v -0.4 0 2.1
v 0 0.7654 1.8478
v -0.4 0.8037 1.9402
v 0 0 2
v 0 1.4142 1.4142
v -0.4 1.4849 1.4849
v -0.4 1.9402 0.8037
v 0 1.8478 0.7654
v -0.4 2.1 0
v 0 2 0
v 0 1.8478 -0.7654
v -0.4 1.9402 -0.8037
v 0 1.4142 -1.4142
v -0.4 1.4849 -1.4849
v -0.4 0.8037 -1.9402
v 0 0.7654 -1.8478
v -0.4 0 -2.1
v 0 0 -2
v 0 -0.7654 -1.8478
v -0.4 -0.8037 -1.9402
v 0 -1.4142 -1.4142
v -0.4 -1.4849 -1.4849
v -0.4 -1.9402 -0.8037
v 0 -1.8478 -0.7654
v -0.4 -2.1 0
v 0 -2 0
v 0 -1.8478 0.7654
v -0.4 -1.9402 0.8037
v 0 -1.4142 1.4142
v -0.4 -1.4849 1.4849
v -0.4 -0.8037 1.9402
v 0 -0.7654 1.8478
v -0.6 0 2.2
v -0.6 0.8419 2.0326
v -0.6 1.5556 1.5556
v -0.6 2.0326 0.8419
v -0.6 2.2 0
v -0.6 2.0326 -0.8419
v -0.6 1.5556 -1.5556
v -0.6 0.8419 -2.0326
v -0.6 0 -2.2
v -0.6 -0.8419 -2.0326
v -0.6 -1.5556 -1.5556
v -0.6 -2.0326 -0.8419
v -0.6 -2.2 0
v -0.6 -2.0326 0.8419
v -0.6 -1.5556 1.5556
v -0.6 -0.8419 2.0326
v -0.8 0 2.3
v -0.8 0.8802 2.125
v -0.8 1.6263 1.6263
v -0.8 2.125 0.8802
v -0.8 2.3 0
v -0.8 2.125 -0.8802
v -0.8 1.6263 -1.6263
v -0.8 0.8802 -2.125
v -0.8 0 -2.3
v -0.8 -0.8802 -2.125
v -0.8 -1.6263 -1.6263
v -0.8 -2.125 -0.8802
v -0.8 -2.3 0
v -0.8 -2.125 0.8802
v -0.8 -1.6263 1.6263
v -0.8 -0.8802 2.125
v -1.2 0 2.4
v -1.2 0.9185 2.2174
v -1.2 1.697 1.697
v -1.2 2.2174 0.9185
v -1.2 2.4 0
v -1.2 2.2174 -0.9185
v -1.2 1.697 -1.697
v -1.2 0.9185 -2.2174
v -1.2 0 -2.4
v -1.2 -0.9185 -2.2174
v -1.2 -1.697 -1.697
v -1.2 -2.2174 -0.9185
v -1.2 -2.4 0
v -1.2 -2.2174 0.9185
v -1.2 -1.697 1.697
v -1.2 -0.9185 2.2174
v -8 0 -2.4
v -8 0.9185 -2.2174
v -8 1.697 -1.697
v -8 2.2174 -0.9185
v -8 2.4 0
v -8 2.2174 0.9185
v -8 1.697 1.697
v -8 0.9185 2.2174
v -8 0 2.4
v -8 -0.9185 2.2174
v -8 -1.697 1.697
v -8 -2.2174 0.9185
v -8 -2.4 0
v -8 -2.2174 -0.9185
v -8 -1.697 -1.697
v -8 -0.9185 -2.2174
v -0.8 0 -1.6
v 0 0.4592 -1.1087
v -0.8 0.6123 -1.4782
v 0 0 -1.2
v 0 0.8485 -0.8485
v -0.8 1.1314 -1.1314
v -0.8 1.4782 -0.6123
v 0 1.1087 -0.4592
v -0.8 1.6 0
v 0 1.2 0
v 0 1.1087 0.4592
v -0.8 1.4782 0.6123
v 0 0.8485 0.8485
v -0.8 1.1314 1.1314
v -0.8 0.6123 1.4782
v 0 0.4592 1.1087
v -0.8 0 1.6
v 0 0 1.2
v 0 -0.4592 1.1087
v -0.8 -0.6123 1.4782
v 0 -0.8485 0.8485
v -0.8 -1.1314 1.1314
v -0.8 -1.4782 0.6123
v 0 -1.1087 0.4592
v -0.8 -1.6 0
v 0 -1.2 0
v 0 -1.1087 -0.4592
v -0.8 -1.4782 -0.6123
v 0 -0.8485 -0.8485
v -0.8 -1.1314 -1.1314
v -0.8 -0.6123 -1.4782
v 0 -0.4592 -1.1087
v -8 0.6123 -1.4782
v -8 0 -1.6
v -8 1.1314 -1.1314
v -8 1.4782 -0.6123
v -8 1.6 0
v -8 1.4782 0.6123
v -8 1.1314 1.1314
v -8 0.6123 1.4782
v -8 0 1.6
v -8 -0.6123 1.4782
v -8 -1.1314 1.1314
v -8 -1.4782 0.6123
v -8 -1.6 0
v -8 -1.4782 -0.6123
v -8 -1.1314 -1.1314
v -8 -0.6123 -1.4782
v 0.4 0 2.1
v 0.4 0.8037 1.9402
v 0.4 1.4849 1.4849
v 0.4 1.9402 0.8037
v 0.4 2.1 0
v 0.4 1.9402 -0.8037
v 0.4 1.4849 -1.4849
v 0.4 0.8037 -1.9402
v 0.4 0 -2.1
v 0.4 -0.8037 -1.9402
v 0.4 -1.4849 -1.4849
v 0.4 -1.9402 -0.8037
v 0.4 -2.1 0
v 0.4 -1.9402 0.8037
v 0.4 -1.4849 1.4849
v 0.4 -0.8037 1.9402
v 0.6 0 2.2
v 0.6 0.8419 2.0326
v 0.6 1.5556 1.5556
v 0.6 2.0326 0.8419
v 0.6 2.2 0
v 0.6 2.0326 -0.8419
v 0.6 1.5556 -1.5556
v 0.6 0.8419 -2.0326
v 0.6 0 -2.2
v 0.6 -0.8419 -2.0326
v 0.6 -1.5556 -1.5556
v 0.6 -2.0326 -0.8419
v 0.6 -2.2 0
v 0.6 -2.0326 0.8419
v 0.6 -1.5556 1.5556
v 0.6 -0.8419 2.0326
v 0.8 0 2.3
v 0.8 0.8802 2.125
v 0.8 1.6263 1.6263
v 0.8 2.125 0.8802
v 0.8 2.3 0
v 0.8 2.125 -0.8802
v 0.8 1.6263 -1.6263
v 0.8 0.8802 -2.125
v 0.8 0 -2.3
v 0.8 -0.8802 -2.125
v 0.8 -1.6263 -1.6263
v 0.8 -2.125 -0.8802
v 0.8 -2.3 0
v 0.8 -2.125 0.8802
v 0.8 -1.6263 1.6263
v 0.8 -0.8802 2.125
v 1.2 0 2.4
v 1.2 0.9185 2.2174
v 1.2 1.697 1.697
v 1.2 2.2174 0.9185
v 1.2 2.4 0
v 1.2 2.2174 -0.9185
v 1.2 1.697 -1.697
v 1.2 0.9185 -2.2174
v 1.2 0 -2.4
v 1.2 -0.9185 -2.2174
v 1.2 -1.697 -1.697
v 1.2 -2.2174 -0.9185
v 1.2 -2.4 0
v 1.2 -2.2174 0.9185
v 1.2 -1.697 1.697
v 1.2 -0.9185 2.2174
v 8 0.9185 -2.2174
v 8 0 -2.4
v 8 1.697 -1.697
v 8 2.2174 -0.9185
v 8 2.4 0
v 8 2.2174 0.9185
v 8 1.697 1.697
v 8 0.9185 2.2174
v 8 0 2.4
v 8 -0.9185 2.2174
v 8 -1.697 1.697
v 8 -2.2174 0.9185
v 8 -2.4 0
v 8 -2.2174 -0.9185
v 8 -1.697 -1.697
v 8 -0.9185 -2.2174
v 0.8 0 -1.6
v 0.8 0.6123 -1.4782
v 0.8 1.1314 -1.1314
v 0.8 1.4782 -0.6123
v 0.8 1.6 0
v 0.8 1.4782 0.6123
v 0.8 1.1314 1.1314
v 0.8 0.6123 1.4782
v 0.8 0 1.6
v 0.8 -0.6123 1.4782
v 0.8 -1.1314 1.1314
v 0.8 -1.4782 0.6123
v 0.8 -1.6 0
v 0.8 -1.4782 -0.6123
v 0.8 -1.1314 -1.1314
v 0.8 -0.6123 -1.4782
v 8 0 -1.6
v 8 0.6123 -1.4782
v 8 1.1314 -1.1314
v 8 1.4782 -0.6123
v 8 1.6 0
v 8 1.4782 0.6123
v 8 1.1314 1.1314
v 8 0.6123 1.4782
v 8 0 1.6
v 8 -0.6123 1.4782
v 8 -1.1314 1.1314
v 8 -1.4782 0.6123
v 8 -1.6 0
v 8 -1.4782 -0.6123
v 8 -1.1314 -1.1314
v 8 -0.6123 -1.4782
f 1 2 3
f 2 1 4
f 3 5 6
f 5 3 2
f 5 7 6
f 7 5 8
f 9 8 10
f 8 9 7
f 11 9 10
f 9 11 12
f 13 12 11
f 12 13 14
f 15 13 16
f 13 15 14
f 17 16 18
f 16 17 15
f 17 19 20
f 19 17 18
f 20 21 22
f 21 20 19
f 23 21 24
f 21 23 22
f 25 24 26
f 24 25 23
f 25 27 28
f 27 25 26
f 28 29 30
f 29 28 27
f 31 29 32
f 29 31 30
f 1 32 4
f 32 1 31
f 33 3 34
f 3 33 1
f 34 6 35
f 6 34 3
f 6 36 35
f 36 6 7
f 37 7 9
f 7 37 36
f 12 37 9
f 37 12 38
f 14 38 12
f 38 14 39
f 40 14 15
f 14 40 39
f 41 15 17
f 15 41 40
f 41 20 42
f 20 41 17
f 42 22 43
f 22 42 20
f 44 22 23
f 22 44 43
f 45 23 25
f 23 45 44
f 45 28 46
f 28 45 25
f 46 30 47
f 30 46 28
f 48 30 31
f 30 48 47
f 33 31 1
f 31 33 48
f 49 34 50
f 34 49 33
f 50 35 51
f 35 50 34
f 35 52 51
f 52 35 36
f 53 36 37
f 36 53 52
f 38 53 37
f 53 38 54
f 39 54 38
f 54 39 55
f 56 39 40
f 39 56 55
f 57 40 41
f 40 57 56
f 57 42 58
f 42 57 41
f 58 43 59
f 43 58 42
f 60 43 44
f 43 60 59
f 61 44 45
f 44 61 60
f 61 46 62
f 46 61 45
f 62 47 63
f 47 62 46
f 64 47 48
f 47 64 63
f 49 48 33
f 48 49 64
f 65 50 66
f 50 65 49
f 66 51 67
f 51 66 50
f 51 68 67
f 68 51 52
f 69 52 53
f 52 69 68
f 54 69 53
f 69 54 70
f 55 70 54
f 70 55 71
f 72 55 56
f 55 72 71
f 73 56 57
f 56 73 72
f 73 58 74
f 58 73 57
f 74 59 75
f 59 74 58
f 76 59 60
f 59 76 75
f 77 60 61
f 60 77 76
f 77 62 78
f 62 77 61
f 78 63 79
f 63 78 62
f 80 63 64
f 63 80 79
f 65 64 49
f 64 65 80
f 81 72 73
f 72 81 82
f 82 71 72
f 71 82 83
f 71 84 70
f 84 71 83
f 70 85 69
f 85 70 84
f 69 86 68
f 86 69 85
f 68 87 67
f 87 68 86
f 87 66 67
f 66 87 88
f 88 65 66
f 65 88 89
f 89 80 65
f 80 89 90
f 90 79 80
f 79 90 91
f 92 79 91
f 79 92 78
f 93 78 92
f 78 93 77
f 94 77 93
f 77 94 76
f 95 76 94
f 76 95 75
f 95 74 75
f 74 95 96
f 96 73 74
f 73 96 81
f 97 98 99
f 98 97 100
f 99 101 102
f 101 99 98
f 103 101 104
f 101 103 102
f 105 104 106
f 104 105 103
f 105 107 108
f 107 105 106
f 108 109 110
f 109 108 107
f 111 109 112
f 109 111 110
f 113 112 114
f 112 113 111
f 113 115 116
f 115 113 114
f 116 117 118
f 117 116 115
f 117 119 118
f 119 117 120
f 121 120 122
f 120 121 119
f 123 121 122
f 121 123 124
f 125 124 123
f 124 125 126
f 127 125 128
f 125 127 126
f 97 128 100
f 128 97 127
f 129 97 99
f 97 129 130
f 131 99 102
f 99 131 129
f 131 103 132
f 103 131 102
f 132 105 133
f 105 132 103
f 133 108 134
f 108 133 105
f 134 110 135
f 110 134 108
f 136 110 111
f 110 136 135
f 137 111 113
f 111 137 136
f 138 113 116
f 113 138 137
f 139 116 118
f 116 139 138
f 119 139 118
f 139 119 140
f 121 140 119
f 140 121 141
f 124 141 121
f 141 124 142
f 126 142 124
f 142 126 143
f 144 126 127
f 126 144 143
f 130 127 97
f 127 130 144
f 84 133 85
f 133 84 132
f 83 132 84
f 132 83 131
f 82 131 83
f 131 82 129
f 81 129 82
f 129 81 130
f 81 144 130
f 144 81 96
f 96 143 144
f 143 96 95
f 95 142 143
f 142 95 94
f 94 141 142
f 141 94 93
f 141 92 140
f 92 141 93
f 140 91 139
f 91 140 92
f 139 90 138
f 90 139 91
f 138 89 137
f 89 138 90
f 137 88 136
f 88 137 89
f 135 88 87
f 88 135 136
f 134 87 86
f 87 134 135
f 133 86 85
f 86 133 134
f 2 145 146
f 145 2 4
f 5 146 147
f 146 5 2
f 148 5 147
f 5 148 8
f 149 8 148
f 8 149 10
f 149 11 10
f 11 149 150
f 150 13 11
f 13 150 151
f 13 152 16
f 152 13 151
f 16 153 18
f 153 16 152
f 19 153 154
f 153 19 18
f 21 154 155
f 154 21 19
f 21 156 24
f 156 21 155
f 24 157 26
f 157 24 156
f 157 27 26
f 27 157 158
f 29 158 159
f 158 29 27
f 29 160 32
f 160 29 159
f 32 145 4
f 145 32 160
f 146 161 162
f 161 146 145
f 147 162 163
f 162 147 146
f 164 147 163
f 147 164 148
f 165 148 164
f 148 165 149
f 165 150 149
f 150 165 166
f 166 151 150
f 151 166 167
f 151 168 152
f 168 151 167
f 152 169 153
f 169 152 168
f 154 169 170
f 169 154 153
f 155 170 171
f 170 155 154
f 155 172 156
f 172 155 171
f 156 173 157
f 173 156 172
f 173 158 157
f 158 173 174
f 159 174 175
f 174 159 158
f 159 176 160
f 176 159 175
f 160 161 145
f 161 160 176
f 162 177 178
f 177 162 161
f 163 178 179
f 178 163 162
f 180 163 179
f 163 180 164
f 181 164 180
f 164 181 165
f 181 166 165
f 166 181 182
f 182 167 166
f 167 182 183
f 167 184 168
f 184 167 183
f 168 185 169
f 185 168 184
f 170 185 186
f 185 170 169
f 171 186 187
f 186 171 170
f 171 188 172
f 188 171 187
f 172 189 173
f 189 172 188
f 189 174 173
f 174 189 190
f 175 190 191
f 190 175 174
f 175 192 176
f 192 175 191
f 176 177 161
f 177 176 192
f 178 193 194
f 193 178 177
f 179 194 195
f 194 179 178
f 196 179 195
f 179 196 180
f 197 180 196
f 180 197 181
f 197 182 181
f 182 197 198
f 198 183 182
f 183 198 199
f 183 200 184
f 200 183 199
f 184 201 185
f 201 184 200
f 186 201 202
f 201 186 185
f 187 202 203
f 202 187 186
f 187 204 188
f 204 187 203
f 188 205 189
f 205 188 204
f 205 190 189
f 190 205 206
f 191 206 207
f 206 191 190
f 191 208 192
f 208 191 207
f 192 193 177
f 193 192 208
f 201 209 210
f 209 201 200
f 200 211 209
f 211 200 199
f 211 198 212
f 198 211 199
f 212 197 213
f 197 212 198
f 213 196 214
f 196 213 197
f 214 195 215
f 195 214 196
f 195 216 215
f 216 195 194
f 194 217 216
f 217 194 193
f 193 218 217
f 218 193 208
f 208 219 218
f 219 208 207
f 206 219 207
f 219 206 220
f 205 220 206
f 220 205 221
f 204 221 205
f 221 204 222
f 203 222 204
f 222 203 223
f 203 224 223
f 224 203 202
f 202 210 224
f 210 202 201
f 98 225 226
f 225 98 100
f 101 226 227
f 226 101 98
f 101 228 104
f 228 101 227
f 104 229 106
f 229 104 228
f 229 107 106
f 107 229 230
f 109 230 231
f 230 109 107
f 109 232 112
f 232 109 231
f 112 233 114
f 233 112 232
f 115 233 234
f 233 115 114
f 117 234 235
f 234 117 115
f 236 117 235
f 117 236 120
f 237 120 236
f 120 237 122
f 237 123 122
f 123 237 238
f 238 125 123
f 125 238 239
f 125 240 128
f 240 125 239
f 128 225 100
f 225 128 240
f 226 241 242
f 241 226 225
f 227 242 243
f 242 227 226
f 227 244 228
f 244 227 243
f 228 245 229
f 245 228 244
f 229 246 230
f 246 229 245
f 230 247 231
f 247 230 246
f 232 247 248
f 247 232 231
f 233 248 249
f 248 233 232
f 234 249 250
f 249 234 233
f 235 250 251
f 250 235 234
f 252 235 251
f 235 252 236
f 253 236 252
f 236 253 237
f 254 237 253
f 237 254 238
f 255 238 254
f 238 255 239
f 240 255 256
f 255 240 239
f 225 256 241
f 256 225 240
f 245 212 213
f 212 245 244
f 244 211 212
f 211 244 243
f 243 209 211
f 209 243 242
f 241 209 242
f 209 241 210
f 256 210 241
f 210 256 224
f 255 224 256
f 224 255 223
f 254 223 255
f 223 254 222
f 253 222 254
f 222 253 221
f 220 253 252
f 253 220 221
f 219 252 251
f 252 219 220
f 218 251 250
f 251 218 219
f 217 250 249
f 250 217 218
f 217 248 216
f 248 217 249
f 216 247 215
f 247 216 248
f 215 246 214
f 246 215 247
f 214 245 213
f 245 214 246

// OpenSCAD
// file: ../p/4-4ring2.scad
use <../lib.scad>
function ldraw_lib__4_4ring2() = [
// 0 Ring  2 x 1.0
// 0 Name: 4-4ring2.dat
// 0 Author: James Jessiman
// 0 !LDRAW_ORG Primitive UPDATE 2009-01
// 0 !LICENSE Licensed under CC BY 4.0 : see CAreadme.txt
// 
// 0 BFC CERTIFY CCW
  [0,"BFC","CERTIFY"],
  [0,"BFC","CCW"],
// 
// 0 !HISTORY 1998-12-15 [PTadmin] Official Update 1998-10
// 0 !HISTORY 2002-04-05 [hafhead] Added BFC statement
// 0 !HISTORY 2002-04-25 [PTadmin] Official Update 2002-02
// 0 !HISTORY 2007-06-24 [PTadmin] Header formatted for Contributor Agreement
// 0 !HISTORY 2008-07-01 [PTadmin] Official Update 2008-01
// 0 !HISTORY 2008-08-26 [cwdee] Switch polygon winding and rename
// 0 !HISTORY 2009-05-02 [PTadmin] Official Update 2009-01
// 
// 
// 4 16 -1.1481 0 2.7717 -0.7654 0 1.8478 0 0 2 0 0 3
  [4,16,-1.1481,0,2.7717,-0.7654,0,1.8478,0,0,2,0,0,3],
// 4 16 -2.1213 0 2.1213 -1.4142 0 1.4142 -0.7654 0 1.8478 -1.1481 0 2.7717
  [4,16,-2.1213,0,2.1213,-1.4142,0,1.4142,-0.7654,0,1.8478,-1.1481,0,2.7717],
// 4 16 -2.7717 0 1.1481 -1.8478 0 0.7654 -1.4142 0 1.4142 -2.1213 0 2.1213
  [4,16,-2.7717,0,1.1481,-1.8478,0,0.7654,-1.4142,0,1.4142,-2.1213,0,2.1213],
// 4 16 -3 0 0 -2 0 0 -1.8478 0 0.7654 -2.7717 0 1.1481
  [4,16,-3,0,0,-2,0,0,-1.8478,0,0.7654,-2.7717,0,1.1481],
// 4 16 -2.7717 0 -1.1481 -1.8478 0 -0.7654 -2 0 0 -3 0 0
  [4,16,-2.7717,0,-1.1481,-1.8478,0,-0.7654,-2,0,0,-3,0,0],
// 4 16 -2.1213 0 -2.1213 -1.4142 0 -1.4142 -1.8478 0 -0.7654 -2.7717 0 -1.1481
  [4,16,-2.1213,0,-2.1213,-1.4142,0,-1.4142,-1.8478,0,-0.7654,-2.7717,0,-1.1481],
// 4 16 -1.1481 0 -2.7717 -0.7654 0 -1.8478 -1.4142 0 -1.4142 -2.1213 0 -2.1213
  [4,16,-1.1481,0,-2.7717,-0.7654,0,-1.8478,-1.4142,0,-1.4142,-2.1213,0,-2.1213],
// 4 16 0 0 -3 0 0 -2 -0.7654 0 -1.8478 -1.1481 0 -2.7717
  [4,16,0,0,-3,0,0,-2,-0.7654,0,-1.8478,-1.1481,0,-2.7717],
// 4 16 1.1481 0 -2.7717 0.7654 0 -1.8478 0 0 -2 0 0 -3
  [4,16,1.1481,0,-2.7717,0.7654,0,-1.8478,0,0,-2,0,0,-3],
// 4 16 2.1213 0 -2.1213 1.4142 0 -1.4142 0.7654 0 -1.8478 1.1481 0 -2.7717
  [4,16,2.1213,0,-2.1213,1.4142,0,-1.4142,0.7654,0,-1.8478,1.1481,0,-2.7717],
// 4 16 2.7717 0 -1.1481 1.8478 0 -0.7654 1.4142 0 -1.4142 2.1213 0 -2.1213
  [4,16,2.7717,0,-1.1481,1.8478,0,-0.7654,1.4142,0,-1.4142,2.1213,0,-2.1213],
// 4 16 3 0 0 2 0 0 1.8478 0 -0.7654 2.7717 0 -1.1481
  [4,16,3,0,0,2,0,0,1.8478,0,-0.7654,2.7717,0,-1.1481],
// 4 16 2.7717 0 1.1481 1.8478 0 0.7654 2 0 0 3 0 0
  [4,16,2.7717,0,1.1481,1.8478,0,0.7654,2,0,0,3,0,0],
// 4 16 2.1213 0 2.1213 1.4142 0 1.4142 1.8478 0 0.7654 2.7717 0 1.1481
  [4,16,2.1213,0,2.1213,1.4142,0,1.4142,1.8478,0,0.7654,2.7717,0,1.1481],
// 4 16 1.1481 0 2.7717 0.7654 0 1.8478 1.4142 0 1.4142 2.1213 0 2.1213
  [4,16,1.1481,0,2.7717,0.7654,0,1.8478,1.4142,0,1.4142,2.1213,0,2.1213],
// 4 16 0 0 3 0 0 2 0.7654 0 1.8478 1.1481 0 2.7717
  [4,16,0,0,3,0,0,2,0.7654,0,1.8478,1.1481,0,2.7717],
// 0
];
module ldraw_lib__4_4ring2(step=0, col=false, unit=2/5, alt=false, line=0.2, solid=!$preview)
    makepoly(ldraw_lib__4_4ring2(), step=step, col=col, unit=unit, alt=alt, line=line, solid=solid);
ldraw_lib__4_4ring2(line=0.2);
// file: ../p/4-4edge.scad
use <../lib.scad>
function ldraw_lib__4_4edge() = [
// 0 Circle 1.0
// 0 Name: 4-4edge.dat
// 0 Author: James Jessiman
// 0 !LDRAW_ORG Primitive UPDATE 2017-01
// 0 !LICENSE Licensed under CC BY 4.0 : see CAreadme.txt
// 
// 0 BFC CERTIFY CCW
  [0,"BFC","CERTIFY"],
  [0,"BFC","CCW"],
// 
// 0 !HISTORY 1998-12-15 [PTadmin] Official Update 1998-10
// 0 !HISTORY 2005-12-28 [PTadmin] Official Update 2005-01
// 0 !HISTORY 2007-06-24 [PTadmin] Header formatted for Contributor Agreement
// 0 !HISTORY 2008-07-01 [PTadmin] Official Update 2008-01
// 0 !HISTORY 2017-01-15 [Steffen] BFCed
// 0 !HISTORY 2017-12-30 [PTadmin] Official Update 2017-01
// 
// 
// 2 24 1 0 0 0.9239 0 0.3827
  [2,24,1,0,0,0.9239,0,0.3827],
// 2 24 0.9239 0 0.3827 0.7071 0 0.7071
  [2,24,0.9239,0,0.3827,0.7071,0,0.7071],
// 2 24 0.7071 0 0.7071 0.3827 0 0.9239
  [2,24,0.7071,0,0.7071,0.3827,0,0.9239],
// 2 24 0.3827 0 0.9239 0 0 1
  [2,24,0.3827,0,0.9239,0,0,1],
// 2 24 0 0 1 -0.3827 0 0.9239
  [2,24,0,0,1,-0.3827,0,0.9239],
// 2 24 -0.3827 0 0.9239 -0.7071 0 0.7071
  [2,24,-0.3827,0,0.9239,-0.7071,0,0.7071],
// 2 24 -0.7071 0 0.7071 -0.9239 0 0.3827
  [2,24,-0.7071,0,0.7071,-0.9239,0,0.3827],
// 2 24 -0.9239 0 0.3827 -1 0 -0
  [2,24,-0.9239,0,0.3827,-1,0,-0],
// 2 24 -1 0 -0 -0.9239 0 -0.3827
  [2,24,-1,0,-0,-0.9239,0,-0.3827],
// 2 24 -0.9239 0 -0.3827 -0.7071 0 -0.7071
  [2,24,-0.9239,0,-0.3827,-0.7071,0,-0.7071],
// 2 24 -0.7071 0 -0.7071 -0.3827 0 -0.9239
  [2,24,-0.7071,0,-0.7071,-0.3827,0,-0.9239],
// 2 24 -0.3827 0 -0.9239 0 0 -1
  [2,24,-0.3827,0,-0.9239,0,0,-1],
// 2 24 0 0 -1 0.3827 0 -0.9239
  [2,24,0,0,-1,0.3827,0,-0.9239],
// 2 24 0.3827 0 -0.9239 0.7071 0 -0.7071
  [2,24,0.3827,0,-0.9239,0.7071,0,-0.7071],
// 2 24 0.7071 0 -0.7071 0.9239 0 -0.3827
  [2,24,0.7071,0,-0.7071,0.9239,0,-0.3827],
// 2 24 0.9239 0 -0.3827 1 0 0
  [2,24,0.9239,0,-0.3827,1,0,0],
];
module ldraw_lib__4_4edge(step=0, col=false, unit=2/5, alt=false, line=0.2, solid=!$preview)
    makepoly(ldraw_lib__4_4edge(), step=step, col=col, unit=unit, alt=alt, line=line, solid=solid);
ldraw_lib__4_4edge(line=0.2);
// file: ../p/4-4cyli.scad
use <../lib.scad>
function ldraw_lib__4_4cyli() = [
// 0 Cylinder 1.0
// 0 Name: 4-4cyli.dat
// 0 Author: James Jessiman
// 0 !LDRAW_ORG Primitive UPDATE 2005-01
// 0 !LICENSE Licensed under CC BY 4.0 : see CAreadme.txt
// 
// 0 BFC CERTIFY CCW
  [0,"BFC","CERTIFY"],
  [0,"BFC","CCW"],
// 
// 0 !HISTORY 1998-12-15 [PTadmin] Official Update 1998-10
// 0 !HISTORY 2002-03-23 [sbliss] Added BFC statement; merged headers from files in distributions LDraw 0.27 and Complete.
// 0 !HISTORY 2002-04-25 [PTadmin] Official Update 2002-02
// 0 !HISTORY 2004-12-14 [guyvivan] BFC CCW
// 0 !HISTORY 2005-12-28 [PTadmin] Official Update 2005-01
// 0 !HISTORY 2007-06-24 [PTadmin] Header formatted for Contributor Agreement
// 0 !HISTORY 2008-07-01 [PTadmin] Official Update 2008-01
// 
// 
// 4 16 1 1 0 0.9239 1 0.3827 0.9239 0 0.3827 1 0 0
  [4,16,1,1,0,0.9239,1,0.3827,0.9239,0,0.3827,1,0,0],
// 5 24 1 0 0 1 1 0 0.9239 0 0.3827 0.9239 0 -0.3827
  [5,24,1,0,0,1,1,0,0.9239,0,0.3827,0.9239,0,-0.3827],
// 4 16 0.9239 1 0.3827 0.7071 1 0.7071 0.7071 0 0.7071 0.9239 0 0.3827
  [4,16,0.9239,1,0.3827,0.7071,1,0.7071,0.7071,0,0.7071,0.9239,0,0.3827],
// 5 24 0.9239 0 0.3827 0.9239 1 0.3827 0.7071 0 0.7071 1 0 0
  [5,24,0.9239,0,0.3827,0.9239,1,0.3827,0.7071,0,0.7071,1,0,0],
// 4 16 0.7071 1 0.7071 0.3827 1 0.9239 0.3827 0 0.9239 0.7071 0 0.7071
  [4,16,0.7071,1,0.7071,0.3827,1,0.9239,0.3827,0,0.9239,0.7071,0,0.7071],
// 5 24 0.7071 0 0.7071 0.7071 1 0.7071 0.3827 0 0.9239 0.9239 0 0.3827
  [5,24,0.7071,0,0.7071,0.7071,1,0.7071,0.3827,0,0.9239,0.9239,0,0.3827],
// 4 16 0.3827 1 0.9239 0 1 1 0 0 1 0.3827 0 0.9239
  [4,16,0.3827,1,0.9239,0,1,1,0,0,1,0.3827,0,0.9239],
// 5 24 0.3827 0 0.9239 0.3827 1 0.9239 0 0 1 0.7071 0 0.7071
  [5,24,0.3827,0,0.9239,0.3827,1,0.9239,0,0,1,0.7071,0,0.7071],
// 4 16 0 1 1 -0.3827 1 0.9239 -0.3827 0 0.9239 0 0 1
  [4,16,0,1,1,-0.3827,1,0.9239,-0.3827,0,0.9239,0,0,1],
// 5 24 0 0 1 0 1 1 -0.3827 0 0.9239 0.3827 0 0.9239
  [5,24,0,0,1,0,1,1,-0.3827,0,0.9239,0.3827,0,0.9239],
// 4 16 -0.3827 1 0.9239 -0.7071 1 0.7071 -0.7071 0 0.7071 -0.3827 0 0.9239
  [4,16,-0.3827,1,0.9239,-0.7071,1,0.7071,-0.7071,0,0.7071,-0.3827,0,0.9239],
// 5 24 -0.3827 0 0.9239 -0.3827 1 0.9239 -0.7071 0 0.7071 0 0 1
  [5,24,-0.3827,0,0.9239,-0.3827,1,0.9239,-0.7071,0,0.7071,0,0,1],
// 4 16 -0.7071 1 0.7071 -0.9239 1 0.3827 -0.9239 0 0.3827 -0.7071 0 0.7071
  [4,16,-0.7071,1,0.7071,-0.9239,1,0.3827,-0.9239,0,0.3827,-0.7071,0,0.7071],
// 5 24 -0.7071 0 0.7071 -0.7071 1 0.7071 -0.9239 0 0.3827 -0.3827 0 0.9239
  [5,24,-0.7071,0,0.7071,-0.7071,1,0.7071,-0.9239,0,0.3827,-0.3827,0,0.9239],
// 4 16 -0.9239 1 0.3827 -1 1 0 -1 0 0 -0.9239 0 0.3827
  [4,16,-0.9239,1,0.3827,-1,1,0,-1,0,0,-0.9239,0,0.3827],
// 5 24 -0.9239 0 0.3827 -0.9239 1 0.3827 -1 0 0 -0.7071 0 0.7071
  [5,24,-0.9239,0,0.3827,-0.9239,1,0.3827,-1,0,0,-0.7071,0,0.7071],
// 4 16 -1 1 0 -0.9239 1 -0.3827 -0.9239 0 -0.3827 -1 0 0
  [4,16,-1,1,0,-0.9239,1,-0.3827,-0.9239,0,-0.3827,-1,0,0],
// 5 24 -1 0 0 -1 1 0 -0.9239 0 -0.3827 -0.9239 0 0.3827
  [5,24,-1,0,0,-1,1,0,-0.9239,0,-0.3827,-0.9239,0,0.3827],
// 4 16 -0.9239 1 -0.3827 -0.7071 1 -0.7071 -0.7071 0 -0.7071 -0.9239 0 -0.3827
  [4,16,-0.9239,1,-0.3827,-0.7071,1,-0.7071,-0.7071,0,-0.7071,-0.9239,0,-0.3827],
// 5 24 -0.9239 0 -0.3827 -0.9239 1 -0.3827 -0.7071 0 -0.7071 -1 0 0
  [5,24,-0.9239,0,-0.3827,-0.9239,1,-0.3827,-0.7071,0,-0.7071,-1,0,0],
// 4 16 -0.7071 1 -0.7071 -0.3827 1 -0.9239 -0.3827 0 -0.9239 -0.7071 0 -0.7071
  [4,16,-0.7071,1,-0.7071,-0.3827,1,-0.9239,-0.3827,0,-0.9239,-0.7071,0,-0.7071],
// 5 24 -0.7071 0 -0.7071 -0.7071 1 -0.7071 -0.3827 0 -0.9239 -0.9239 0 -0.3827
  [5,24,-0.7071,0,-0.7071,-0.7071,1,-0.7071,-0.3827,0,-0.9239,-0.9239,0,-0.3827],
// 4 16 -0.3827 1 -0.9239 0 1 -1 0 0 -1 -0.3827 0 -0.9239
  [4,16,-0.3827,1,-0.9239,0,1,-1,0,0,-1,-0.3827,0,-0.9239],
// 5 24 -0.3827 0 -0.9239 -0.3827 1 -0.9239 0 0 -1 -0.7071 0 -0.7071
  [5,24,-0.3827,0,-0.9239,-0.3827,1,-0.9239,0,0,-1,-0.7071,0,-0.7071],
// 4 16 0 1 -1 0.3827 1 -0.9239 0.3827 0 -0.9239 0 0 -1
  [4,16,0,1,-1,0.3827,1,-0.9239,0.3827,0,-0.9239,0,0,-1],
// 5 24 0 0 -1 0 1 -1 0.3827 0 -0.9239 -0.3827 0 -0.9239
  [5,24,0,0,-1,0,1,-1,0.3827,0,-0.9239,-0.3827,0,-0.9239],
// 4 16 0.3827 1 -0.9239 0.7071 1 -0.7071 0.7071 0 -0.7071 0.3827 0 -0.9239
  [4,16,0.3827,1,-0.9239,0.7071,1,-0.7071,0.7071,0,-0.7071,0.3827,0,-0.9239],
// 5 24 0.3827 0 -0.9239 0.3827 1 -0.9239 0.7071 0 -0.7071 0 0 -1
  [5,24,0.3827,0,-0.9239,0.3827,1,-0.9239,0.7071,0,-0.7071,0,0,-1],
// 4 16 0.7071 1 -0.7071 0.9239 1 -0.3827 0.9239 0 -0.3827 0.7071 0 -0.7071
  [4,16,0.7071,1,-0.7071,0.9239,1,-0.3827,0.9239,0,-0.3827,0.7071,0,-0.7071],
// 5 24 0.7071 0 -0.7071 0.7071 1 -0.7071 0.9239 0 -0.3827 0.3827 0 -0.9239
  [5,24,0.7071,0,-0.7071,0.7071,1,-0.7071,0.9239,0,-0.3827,0.3827,0,-0.9239],
// 4 16 0.9239 1 -0.3827 1 1 0 1 0 0 0.9239 0 -0.3827
  [4,16,0.9239,1,-0.3827,1,1,0,1,0,0,0.9239,0,-0.3827],
// 5 24 0.9239 0 -0.3827 0.9239 1 -0.3827 1 0 0 0.7071 0 -0.7071
  [5,24,0.9239,0,-0.3827,0.9239,1,-0.3827,1,0,0,0.7071,0,-0.7071],
// 0
];
module ldraw_lib__4_4cyli(step=0, col=false, unit=2/5, alt=false, line=0.2, solid=!$preview)
    makepoly(ldraw_lib__4_4cyli(), step=step, col=col, unit=unit, alt=alt, line=line, solid=solid);
ldraw_lib__4_4cyli(line=0.2);
// file: ../p/4-4con3.scad
use <../lib.scad>
function ldraw_lib__4_4con3() = [
// 0 Cone  3 x 1.0
// 0 Name: 4-4con3.dat
// 0 Author: Niels Karsdorp [nielsk]
// 0 !LDRAW_ORG Primitive UPDATE 2003-02
// 0 !LICENSE Licensed under CC BY 4.0 : see CAreadme.txt
// 
// 0 BFC CERTIFY CCW
  [0,"BFC","CERTIFY"],
  [0,"BFC","CCW"],
// 
// 0 !HISTORY 2003-08-01 [PTadmin] Official Update 2003-02
// 0 !HISTORY 2007-06-24 [PTadmin] Header formatted for Contributor Agreement
// 0 !HISTORY 2008-07-01 [PTadmin] Official Update 2008-01
// 
// 
// 5 24 3 1 0 4 0 0 2.7717 1 1.1481 2.7717 1 -1.1481
  [5,24,3,1,0,4,0,0,2.7717,1,1.1481,2.7717,1,-1.1481],
// 5 24 2.7717 1 1.1481 3.6956 0 1.5308 2.1213 1 2.1213 3 1 0
  [5,24,2.7717,1,1.1481,3.6956,0,1.5308,2.1213,1,2.1213,3,1,0],
// 5 24 2.1213 1 2.1213 2.8284 0 2.8284 1.1481 1 2.7717 2.7717 1 1.1481
  [5,24,2.1213,1,2.1213,2.8284,0,2.8284,1.1481,1,2.7717,2.7717,1,1.1481],
// 5 24 1.1481 1 2.7717 1.5308 0 3.6956 0 1 3 2.1213 1 2.1213
  [5,24,1.1481,1,2.7717,1.5308,0,3.6956,0,1,3,2.1213,1,2.1213],
// 5 24 0 1 3 0 0 4 -1.1481 1 2.7717 1.1481 1 2.7717
  [5,24,0,1,3,0,0,4,-1.1481,1,2.7717,1.1481,1,2.7717],
// 5 24 -1.1481 1 2.7717 -1.5308 0 3.6956 -2.1213 1 2.1213 0 1 3
  [5,24,-1.1481,1,2.7717,-1.5308,0,3.6956,-2.1213,1,2.1213,0,1,3],
// 5 24 -2.1213 1 2.1213 -2.8284 0 2.8284 -2.7717 1 1.1481 -1.1481 1 2.7717
  [5,24,-2.1213,1,2.1213,-2.8284,0,2.8284,-2.7717,1,1.1481,-1.1481,1,2.7717],
// 5 24 -2.7717 1 1.1481 -3.6956 0 1.5308 -3 1 0 -2.1213 1 2.1213
  [5,24,-2.7717,1,1.1481,-3.6956,0,1.5308,-3,1,0,-2.1213,1,2.1213],
// 5 24 -3 1 0 -4 0 0 -2.7717 1 -1.1481 -2.7717 1 1.1481
  [5,24,-3,1,0,-4,0,0,-2.7717,1,-1.1481,-2.7717,1,1.1481],
// 5 24 -2.7717 1 -1.1481 -3.6956 0 -1.5308 -2.1213 1 -2.1213 -3 1 0
  [5,24,-2.7717,1,-1.1481,-3.6956,0,-1.5308,-2.1213,1,-2.1213,-3,1,0],
// 5 24 -2.1213 1 -2.1213 -2.8284 0 -2.8284 -1.1481 1 -2.7717 -2.7717 1 -1.1481
  [5,24,-2.1213,1,-2.1213,-2.8284,0,-2.8284,-1.1481,1,-2.7717,-2.7717,1,-1.1481],
// 5 24 -1.1481 1 -2.7717 -1.5308 0 -3.6956 0 1 -3 -2.1213 1 -2.1213
  [5,24,-1.1481,1,-2.7717,-1.5308,0,-3.6956,0,1,-3,-2.1213,1,-2.1213],
// 5 24 0 1 -3 0 0 -4 1.1481 1 -2.7717 -1.1481 1 -2.7717
  [5,24,0,1,-3,0,0,-4,1.1481,1,-2.7717,-1.1481,1,-2.7717],
// 5 24 1.1481 1 -2.7717 1.5308 0 -3.6956 2.1213 1 -2.1213 0 1 -3
  [5,24,1.1481,1,-2.7717,1.5308,0,-3.6956,2.1213,1,-2.1213,0,1,-3],
// 5 24 2.1213 1 -2.1213 2.8284 0 -2.8284 2.7717 1 -1.1481 1.1481 1 -2.7717
  [5,24,2.1213,1,-2.1213,2.8284,0,-2.8284,2.7717,1,-1.1481,1.1481,1,-2.7717],
// 5 24 2.7717 1 -1.1481 3.6956 0 -1.5308 3 1 0 2.1213 1 -2.1213
  [5,24,2.7717,1,-1.1481,3.6956,0,-1.5308,3,1,0,2.1213,1,-2.1213],
// 
// 4 16 3 1 0 2.7717 1 1.1481 3.6956 0 1.5308 4 0 0
  [4,16,3,1,0,2.7717,1,1.1481,3.6956,0,1.5308,4,0,0],
// 4 16 2.7717 1 1.1481 2.1213 1 2.1213 2.8284 0 2.8284 3.6956 0 1.5308
  [4,16,2.7717,1,1.1481,2.1213,1,2.1213,2.8284,0,2.8284,3.6956,0,1.5308],
// 4 16 2.1213 1 2.1213 1.1481 1 2.7717 1.5308 0 3.6956 2.8284 0 2.8284
  [4,16,2.1213,1,2.1213,1.1481,1,2.7717,1.5308,0,3.6956,2.8284,0,2.8284],
// 4 16 1.1481 1 2.7717 0 1 3 0 0 4 1.5308 0 3.6956
  [4,16,1.1481,1,2.7717,0,1,3,0,0,4,1.5308,0,3.6956],
// 4 16 0 1 3 -1.1481 1 2.7717 -1.5308 0 3.6956 0 0 4
  [4,16,0,1,3,-1.1481,1,2.7717,-1.5308,0,3.6956,0,0,4],
// 4 16 -1.1481 1 2.7717 -2.1213 1 2.1213 -2.8284 0 2.8284 -1.5308 0 3.6956
  [4,16,-1.1481,1,2.7717,-2.1213,1,2.1213,-2.8284,0,2.8284,-1.5308,0,3.6956],
// 4 16 -2.1213 1 2.1213 -2.7717 1 1.1481 -3.6956 0 1.5308 -2.8284 0 2.8284
  [4,16,-2.1213,1,2.1213,-2.7717,1,1.1481,-3.6956,0,1.5308,-2.8284,0,2.8284],
// 4 16 -2.7717 1 1.1481 -3 1 0 -4 0 0 -3.6956 0 1.5308
  [4,16,-2.7717,1,1.1481,-3,1,0,-4,0,0,-3.6956,0,1.5308],
// 4 16 -3 1 0 -2.7717 1 -1.1481 -3.6956 0 -1.5308 -4 0 0
  [4,16,-3,1,0,-2.7717,1,-1.1481,-3.6956,0,-1.5308,-4,0,0],
// 4 16 -2.7717 1 -1.1481 -2.1213 1 -2.1213 -2.8284 0 -2.8284 -3.6956 0 -1.5308
  [4,16,-2.7717,1,-1.1481,-2.1213,1,-2.1213,-2.8284,0,-2.8284,-3.6956,0,-1.5308],
// 4 16 -2.1213 1 -2.1213 -1.1481 1 -2.7717 -1.5308 0 -3.6956 -2.8284 0 -2.8284
  [4,16,-2.1213,1,-2.1213,-1.1481,1,-2.7717,-1.5308,0,-3.6956,-2.8284,0,-2.8284],
// 4 16 -1.1481 1 -2.7717 0 1 -3 0 0 -4 -1.5308 0 -3.6956
  [4,16,-1.1481,1,-2.7717,0,1,-3,0,0,-4,-1.5308,0,-3.6956],
// 4 16 0 1 -3 1.1481 1 -2.7717 1.5308 0 -3.6956 0 0 -4
  [4,16,0,1,-3,1.1481,1,-2.7717,1.5308,0,-3.6956,0,0,-4],
// 4 16 1.1481 1 -2.7717 2.1213 1 -2.1213 2.8284 0 -2.8284 1.5308 0 -3.6956
  [4,16,1.1481,1,-2.7717,2.1213,1,-2.1213,2.8284,0,-2.8284,1.5308,0,-3.6956],
// 4 16 2.1213 1 -2.1213 2.7717 1 -1.1481 3.6956 0 -1.5308 2.8284 0 -2.8284
  [4,16,2.1213,1,-2.1213,2.7717,1,-1.1481,3.6956,0,-1.5308,2.8284,0,-2.8284],
// 4 16 2.7717 1 -1.1481 3 1 0 4 0 0 3.6956 0 -1.5308
  [4,16,2.7717,1,-1.1481,3,1,0,4,0,0,3.6956,0,-1.5308],
// 
// 0
// 
];
module ldraw_lib__4_4con3(step=0, col=false, unit=2/5, alt=false, line=0.2, solid=!$preview)
    makepoly(ldraw_lib__4_4con3(), step=step, col=col, unit=unit, alt=alt, line=line, solid=solid);
ldraw_lib__4_4con3(line=0.2);
// file: ../p/4-4con22.scad
use <../lib.scad>
function ldraw_lib__4_4con22() = [
// 0 Cone 22 x 1.0
// 0 Name: 4-4con22.dat
// 0 Author: Michael Heidemann [mikeheide]
// 0 !LDRAW_ORG Primitive UPDATE 2009-03
// 0 !LICENSE Licensed under CC BY 4.0 : see CAreadme.txt
// 
// 0 BFC CERTIFY CCW
  [0,"BFC","CERTIFY"],
  [0,"BFC","CCW"],
// 
// 0 !HISTORY 2009-12-29 [PTadmin] Official Update 2009-03
// 
// 
// 4 16 22 1 0 20.3258 1 8.4194 21.2497 0 8.8021 23 0 0
  [4,16,22,1,0,20.3258,1,8.4194,21.2497,0,8.8021,23,0,0],
// 4 16 20.3258 1 8.4194 15.5562 1 15.5562 16.2633 0 16.2633 21.2497 0 8.8021
  [4,16,20.3258,1,8.4194,15.5562,1,15.5562,16.2633,0,16.2633,21.2497,0,8.8021],
// 4 16 15.5562 1 15.5562 8.4194 1 20.3258 8.8021 0 21.2497 16.2633 0 16.2633
  [4,16,15.5562,1,15.5562,8.4194,1,20.3258,8.8021,0,21.2497,16.2633,0,16.2633],
// 4 16 8.4194 1 20.3258 0 1 22 0 0 23 8.8021 0 21.2497
  [4,16,8.4194,1,20.3258,0,1,22,0,0,23,8.8021,0,21.2497],
// 4 16 0 1 22 -8.4194 1 20.3258 -8.8021 0 21.2497 0 0 23
  [4,16,0,1,22,-8.4194,1,20.3258,-8.8021,0,21.2497,0,0,23],
// 4 16 -8.4194 1 20.3258 -15.5562 1 15.5562 -16.2633 0 16.2633 -8.8021 0 21.2497
  [4,16,-8.4194,1,20.3258,-15.5562,1,15.5562,-16.2633,0,16.2633,-8.8021,0,21.2497],
// 4 16 -15.5562 1 15.5562 -20.3258 1 8.4194 -21.2497 0 8.8021 -16.2633 0 16.2633
  [4,16,-15.5562,1,15.5562,-20.3258,1,8.4194,-21.2497,0,8.8021,-16.2633,0,16.2633],
// 4 16 -20.3258 1 8.4194 -22 1 0 -23 0 0 -21.2497 0 8.8021
  [4,16,-20.3258,1,8.4194,-22,1,0,-23,0,0,-21.2497,0,8.8021],
// 4 16 -22 1 0 -20.3258 1 -8.4194 -21.2497 0 -8.8021 -23 0 0
  [4,16,-22,1,0,-20.3258,1,-8.4194,-21.2497,0,-8.8021,-23,0,0],
// 4 16 -20.3258 1 -8.4194 -15.5562 1 -15.5562 -16.2633 0 -16.2633 -21.2497 0 -8.8021
  [4,16,-20.3258,1,-8.4194,-15.5562,1,-15.5562,-16.2633,0,-16.2633,-21.2497,0,-8.8021],
// 4 16 -15.5562 1 -15.5562 -8.4194 1 -20.3258 -8.8021 0 -21.2497 -16.2633 0 -16.2633
  [4,16,-15.5562,1,-15.5562,-8.4194,1,-20.3258,-8.8021,0,-21.2497,-16.2633,0,-16.2633],
// 4 16 -8.4194 1 -20.3258 0 1 -22 0 0 -23 -8.8021 0 -21.2497
  [4,16,-8.4194,1,-20.3258,0,1,-22,0,0,-23,-8.8021,0,-21.2497],
// 4 16 0 1 -22 8.4194 1 -20.3258 8.8021 0 -21.2497 0 0 -23
  [4,16,0,1,-22,8.4194,1,-20.3258,8.8021,0,-21.2497,0,0,-23],
// 4 16 8.4194 1 -20.3258 15.5562 1 -15.5562 16.2633 0 -16.2633 8.8021 0 -21.2497
  [4,16,8.4194,1,-20.3258,15.5562,1,-15.5562,16.2633,0,-16.2633,8.8021,0,-21.2497],
// 4 16 15.5562 1 -15.5562 20.3258 1 -8.4194 21.2497 0 -8.8021 16.2633 0 -16.2633
  [4,16,15.5562,1,-15.5562,20.3258,1,-8.4194,21.2497,0,-8.8021,16.2633,0,-16.2633],
// 4 16 20.3258 1 -8.4194 22 1 0 23 0 0 21.2497 0 -8.8021
  [4,16,20.3258,1,-8.4194,22,1,0,23,0,0,21.2497,0,-8.8021],
// 
// 0 conditional lines
// 5 24 22 1 0 23 0 0 20.3258 1 -8.4194 20.3258 1 8.4194
  [5,24,22,1,0,23,0,0,20.3258,1,-8.4194,20.3258,1,8.4194],
// 5 24 20.3258 1 8.4194 21.2497 0 8.8021 22 1 0 15.5562 1 15.5562
  [5,24,20.3258,1,8.4194,21.2497,0,8.8021,22,1,0,15.5562,1,15.5562],
// 5 24 15.5562 1 15.5562 16.2633 0 16.2633 20.3258 1 8.4194 8.4194 1 20.3258
  [5,24,15.5562,1,15.5562,16.2633,0,16.2633,20.3258,1,8.4194,8.4194,1,20.3258],
// 5 24 8.4194 1 20.3258 8.8021 0 21.2497 15.5562 1 15.5562 0 1 22
  [5,24,8.4194,1,20.3258,8.8021,0,21.2497,15.5562,1,15.5562,0,1,22],
// 5 24 0 1 22 0 0 23 8.4194 1 20.3258 -8.4194 1 20.3258
  [5,24,0,1,22,0,0,23,8.4194,1,20.3258,-8.4194,1,20.3258],
// 5 24 -8.4194 1 20.3258 -8.8021 0 21.2497 0 1 22 -15.5562 1 15.5562
  [5,24,-8.4194,1,20.3258,-8.8021,0,21.2497,0,1,22,-15.5562,1,15.5562],
// 5 24 -15.5562 1 15.5562 -16.2633 0 16.2633 -8.4194 1 20.3258 -20.3258 1 8.4194
  [5,24,-15.5562,1,15.5562,-16.2633,0,16.2633,-8.4194,1,20.3258,-20.3258,1,8.4194],
// 5 24 -20.3258 1 8.4194 -21.2497 0 8.8021 -15.5562 1 15.5562 -22 1 0
  [5,24,-20.3258,1,8.4194,-21.2497,0,8.8021,-15.5562,1,15.5562,-22,1,0],
// 5 24 -22 1 0 -23 0 0 -20.3258 1 8.4194 -20.3258 1 -8.4194
  [5,24,-22,1,0,-23,0,0,-20.3258,1,8.4194,-20.3258,1,-8.4194],
// 5 24 -20.3258 1 -8.4194 -21.2497 0 -8.8021 -22 1 0 -15.5562 1 -15.5562
  [5,24,-20.3258,1,-8.4194,-21.2497,0,-8.8021,-22,1,0,-15.5562,1,-15.5562],
// 5 24 -15.5562 1 -15.5562 -16.2633 0 -16.2633 -20.3258 1 -8.4194 -8.4194 1 -20.3258
  [5,24,-15.5562,1,-15.5562,-16.2633,0,-16.2633,-20.3258,1,-8.4194,-8.4194,1,-20.3258],
// 5 24 -8.4194 1 -20.3258 -8.8021 0 -21.2497 -15.5562 1 -15.5562 0 1 -22
  [5,24,-8.4194,1,-20.3258,-8.8021,0,-21.2497,-15.5562,1,-15.5562,0,1,-22],
// 5 24 0 1 -22 0 0 -23 -8.4194 1 -20.3258 8.4194 1 -20.3258
  [5,24,0,1,-22,0,0,-23,-8.4194,1,-20.3258,8.4194,1,-20.3258],
// 5 24 8.4194 1 -20.3258 8.8021 0 -21.2497 0 1 -22 15.5562 1 -15.5562
  [5,24,8.4194,1,-20.3258,8.8021,0,-21.2497,0,1,-22,15.5562,1,-15.5562],
// 5 24 15.5562 1 -15.5562 16.2633 0 -16.2633 8.4194 1 -20.3258 20.3258 1 -8.4194
  [5,24,15.5562,1,-15.5562,16.2633,0,-16.2633,8.4194,1,-20.3258,20.3258,1,-8.4194],
// 5 24 20.3258 1 -8.4194 21.2497 0 -8.8021 15.5562 1 -15.5562 22 1 0
  [5,24,20.3258,1,-8.4194,21.2497,0,-8.8021,15.5562,1,-15.5562,22,1,0],
// 
// 0 end of file
// 
];
module ldraw_lib__4_4con22(step=0, col=false, unit=2/5, alt=false, line=0.2, solid=!$preview)
    makepoly(ldraw_lib__4_4con22(), step=step, col=col, unit=unit, alt=alt, line=line, solid=solid);
ldraw_lib__4_4con22(line=0.2);
// file: ../p/4-4con21.scad
use <../lib.scad>
function ldraw_lib__4_4con21() = [
// 0 Cone 21 x 1.0
// 0 Name: 4-4con21.dat
// 0 Author: Niels Karsdorp [nielsk]
// 0 !LDRAW_ORG Primitive UPDATE 2009-01
// 0 !LICENSE Licensed under CC BY 4.0 : see CAreadme.txt
// 
// 0 BFC CERTIFY CCW
  [0,"BFC","CERTIFY"],
  [0,"BFC","CCW"],
// 
// 0 !HISTORY 2009-05-02 [PTadmin] Official Update 2009-01
// 
// 
// 4 16 21 1 0 19.4019 1 8.0367 20.3258 0 8.4194 22 0 0
  [4,16,21,1,0,19.4019,1,8.0367,20.3258,0,8.4194,22,0,0],
// 4 16 19.4019 1 8.0367 14.8491 1 14.8491 15.5562 0 15.5562 20.3258 0 8.4194
  [4,16,19.4019,1,8.0367,14.8491,1,14.8491,15.5562,0,15.5562,20.3258,0,8.4194],
// 4 16 14.8491 1 14.8491 8.0367 1 19.4019 8.4194 0 20.3258 15.5562 0 15.5562
  [4,16,14.8491,1,14.8491,8.0367,1,19.4019,8.4194,0,20.3258,15.5562,0,15.5562],
// 4 16 8.0367 1 19.4019 0 1 21 0 0 22 8.4194 0 20.3258
  [4,16,8.0367,1,19.4019,0,1,21,0,0,22,8.4194,0,20.3258],
// 4 16 0 1 21 -8.0367 1 19.4019 -8.4194 0 20.3258 0 0 22
  [4,16,0,1,21,-8.0367,1,19.4019,-8.4194,0,20.3258,0,0,22],
// 4 16 -8.0367 1 19.4019 -14.8491 1 14.8491 -15.5562 0 15.5562 -8.4194 0 20.3258
  [4,16,-8.0367,1,19.4019,-14.8491,1,14.8491,-15.5562,0,15.5562,-8.4194,0,20.3258],
// 4 16 -14.8491 1 14.8491 -19.4019 1 8.0367 -20.3258 0 8.4194 -15.5562 0 15.5562
  [4,16,-14.8491,1,14.8491,-19.4019,1,8.0367,-20.3258,0,8.4194,-15.5562,0,15.5562],
// 4 16 -19.4019 1 8.0367 -21 1 0 -22 0 0 -20.3258 0 8.4194
  [4,16,-19.4019,1,8.0367,-21,1,0,-22,0,0,-20.3258,0,8.4194],
// 4 16 -21 1 0 -19.4019 1 -8.0367 -20.3258 0 -8.4194 -22 0 0
  [4,16,-21,1,0,-19.4019,1,-8.0367,-20.3258,0,-8.4194,-22,0,0],
// 4 16 -19.4019 1 -8.0367 -14.8491 1 -14.8491 -15.5562 0 -15.5562 -20.3258 0 -8.4194
  [4,16,-19.4019,1,-8.0367,-14.8491,1,-14.8491,-15.5562,0,-15.5562,-20.3258,0,-8.4194],
// 4 16 -14.8491 1 -14.8491 -8.0367 1 -19.4019 -8.4194 0 -20.3258 -15.5562 0 -15.5562
  [4,16,-14.8491,1,-14.8491,-8.0367,1,-19.4019,-8.4194,0,-20.3258,-15.5562,0,-15.5562],
// 4 16 -8.0367 1 -19.4019 0 1 -21 0 0 -22 -8.4194 0 -20.3258
  [4,16,-8.0367,1,-19.4019,0,1,-21,0,0,-22,-8.4194,0,-20.3258],
// 4 16 0 1 -21 8.0367 1 -19.4019 8.4194 0 -20.3258 0 0 -22
  [4,16,0,1,-21,8.0367,1,-19.4019,8.4194,0,-20.3258,0,0,-22],
// 4 16 8.0367 1 -19.4019 14.8491 1 -14.8491 15.5562 0 -15.5562 8.4194 0 -20.3258
  [4,16,8.0367,1,-19.4019,14.8491,1,-14.8491,15.5562,0,-15.5562,8.4194,0,-20.3258],
// 4 16 14.8491 1 -14.8491 19.4019 1 -8.0367 20.3258 0 -8.4194 15.5562 0 -15.5562
  [4,16,14.8491,1,-14.8491,19.4019,1,-8.0367,20.3258,0,-8.4194,15.5562,0,-15.5562],
// 4 16 19.4019 1 -8.0367 21 1 0 22 0 0 20.3258 0 -8.4194
  [4,16,19.4019,1,-8.0367,21,1,0,22,0,0,20.3258,0,-8.4194],
// 
// 0 conditional lines
// 5 24 21 1 0 22 0 0 19.4019 1 -8.0367 19.4019 1 8.0367
  [5,24,21,1,0,22,0,0,19.4019,1,-8.0367,19.4019,1,8.0367],
// 5 24 19.4019 1 8.0367 20.3258 0 8.4194 21 1 0 14.8491 1 14.8491
  [5,24,19.4019,1,8.0367,20.3258,0,8.4194,21,1,0,14.8491,1,14.8491],
// 5 24 14.8491 1 14.8491 15.5562 0 15.5562 19.4019 1 8.0367 8.0367 1 19.4019
  [5,24,14.8491,1,14.8491,15.5562,0,15.5562,19.4019,1,8.0367,8.0367,1,19.4019],
// 5 24 8.0367 1 19.4019 8.4194 0 20.3258 14.8491 1 14.8491 0 1 21
  [5,24,8.0367,1,19.4019,8.4194,0,20.3258,14.8491,1,14.8491,0,1,21],
// 5 24 0 1 21 0 0 22 8.0367 1 19.4019 -8.0367 1 19.4019
  [5,24,0,1,21,0,0,22,8.0367,1,19.4019,-8.0367,1,19.4019],
// 5 24 -8.0367 1 19.4019 -8.4194 0 20.3258 0 1 21 -14.8491 1 14.8491
  [5,24,-8.0367,1,19.4019,-8.4194,0,20.3258,0,1,21,-14.8491,1,14.8491],
// 5 24 -14.8491 1 14.8491 -15.5562 0 15.5562 -8.0367 1 19.4019 -19.4019 1 8.0367
  [5,24,-14.8491,1,14.8491,-15.5562,0,15.5562,-8.0367,1,19.4019,-19.4019,1,8.0367],
// 5 24 -19.4019 1 8.0367 -20.3258 0 8.4194 -14.8491 1 14.8491 -21 1 0
  [5,24,-19.4019,1,8.0367,-20.3258,0,8.4194,-14.8491,1,14.8491,-21,1,0],
// 5 24 -21 1 0 -22 0 0 -19.4019 1 8.0367 -19.4019 1 -8.0367
  [5,24,-21,1,0,-22,0,0,-19.4019,1,8.0367,-19.4019,1,-8.0367],
// 5 24 -19.4019 1 -8.0367 -20.3258 0 -8.4194 -21 1 0 -14.8491 1 -14.8491
  [5,24,-19.4019,1,-8.0367,-20.3258,0,-8.4194,-21,1,0,-14.8491,1,-14.8491],
// 5 24 -14.8491 1 -14.8491 -15.5562 0 -15.5562 -19.4019 1 -8.0367 -8.0367 1 -19.4019
  [5,24,-14.8491,1,-14.8491,-15.5562,0,-15.5562,-19.4019,1,-8.0367,-8.0367,1,-19.4019],
// 5 24 -8.0367 1 -19.4019 -8.4194 0 -20.3258 -14.8491 1 -14.8491 0 1 -21
  [5,24,-8.0367,1,-19.4019,-8.4194,0,-20.3258,-14.8491,1,-14.8491,0,1,-21],
// 5 24 0 1 -21 0 0 -22 -8.0367 1 -19.4019 8.0367 1 -19.4019
  [5,24,0,1,-21,0,0,-22,-8.0367,1,-19.4019,8.0367,1,-19.4019],
// 5 24 8.0367 1 -19.4019 8.4194 0 -20.3258 0 1 -21 14.8491 1 -14.8491
  [5,24,8.0367,1,-19.4019,8.4194,0,-20.3258,0,1,-21,14.8491,1,-14.8491],
// 5 24 14.8491 1 -14.8491 15.5562 0 -15.5562 8.0367 1 -19.4019 19.4019 1 -8.0367
  [5,24,14.8491,1,-14.8491,15.5562,0,-15.5562,8.0367,1,-19.4019,19.4019,1,-8.0367],
// 5 24 19.4019 1 -8.0367 20.3258 0 -8.4194 14.8491 1 -14.8491 21 1 0
  [5,24,19.4019,1,-8.0367,20.3258,0,-8.4194,14.8491,1,-14.8491,21,1,0],
// 
// 0 end of file
// 
];
module ldraw_lib__4_4con21(step=0, col=false, unit=2/5, alt=false, line=0.2, solid=!$preview)
    makepoly(ldraw_lib__4_4con21(), step=step, col=col, unit=unit, alt=alt, line=line, solid=solid);
ldraw_lib__4_4con21(line=0.2);
// file: ../p/4-4con20.scad
use <../lib.scad>
function ldraw_lib__4_4con20() = [
// 0 Cone 20 x 1.0
// 0 Name: 4-4con20.dat
// 0 Author: Michael Heidemann [mikeheide]
// 0 !LDRAW_ORG Primitive UPDATE 2009-03
// 0 !LICENSE Licensed under CC BY 4.0 : see CAreadme.txt
// 
// 0 BFC CERTIFY CCW
  [0,"BFC","CERTIFY"],
  [0,"BFC","CCW"],
// 
// 0 !HISTORY 2009-12-29 [PTadmin] Official Update 2009-03
// 
// 
// 4 16 20 1 0 18.478 1 7.654 19.4019 0 8.0367 21 0 0
  [4,16,20,1,0,18.478,1,7.654,19.4019,0,8.0367,21,0,0],
// 4 16 18.478 1 7.654 14.142 1 14.142 14.8491 0 14.8491 19.4019 0 8.0367
  [4,16,18.478,1,7.654,14.142,1,14.142,14.8491,0,14.8491,19.4019,0,8.0367],
// 4 16 14.142 1 14.142 7.654 1 18.478 8.0367 0 19.4019 14.8491 0 14.8491
  [4,16,14.142,1,14.142,7.654,1,18.478,8.0367,0,19.4019,14.8491,0,14.8491],
// 4 16 7.654 1 18.478 0 1 20 0 0 21 8.0367 0 19.4019
  [4,16,7.654,1,18.478,0,1,20,0,0,21,8.0367,0,19.4019],
// 4 16 0 1 20 -7.654 1 18.478 -8.0367 0 19.4019 0 0 21
  [4,16,0,1,20,-7.654,1,18.478,-8.0367,0,19.4019,0,0,21],
// 4 16 -7.654 1 18.478 -14.142 1 14.142 -14.8491 0 14.8491 -8.0367 0 19.4019
  [4,16,-7.654,1,18.478,-14.142,1,14.142,-14.8491,0,14.8491,-8.0367,0,19.4019],
// 4 16 -14.142 1 14.142 -18.478 1 7.654 -19.4019 0 8.0367 -14.8491 0 14.8491
  [4,16,-14.142,1,14.142,-18.478,1,7.654,-19.4019,0,8.0367,-14.8491,0,14.8491],
// 4 16 -18.478 1 7.654 -20 1 0 -21 0 0 -19.4019 0 8.0367
  [4,16,-18.478,1,7.654,-20,1,0,-21,0,0,-19.4019,0,8.0367],
// 4 16 -20 1 0 -18.478 1 -7.654 -19.4019 0 -8.0367 -21 0 0
  [4,16,-20,1,0,-18.478,1,-7.654,-19.4019,0,-8.0367,-21,0,0],
// 4 16 -18.478 1 -7.654 -14.142 1 -14.142 -14.8491 0 -14.8491 -19.4019 0 -8.0367
  [4,16,-18.478,1,-7.654,-14.142,1,-14.142,-14.8491,0,-14.8491,-19.4019,0,-8.0367],
// 4 16 -14.142 1 -14.142 -7.654 1 -18.478 -8.0367 0 -19.4019 -14.8491 0 -14.8491
  [4,16,-14.142,1,-14.142,-7.654,1,-18.478,-8.0367,0,-19.4019,-14.8491,0,-14.8491],
// 4 16 -7.654 1 -18.478 0 1 -20 0 0 -21 -8.0367 0 -19.4019
  [4,16,-7.654,1,-18.478,0,1,-20,0,0,-21,-8.0367,0,-19.4019],
// 4 16 0 1 -20 7.654 1 -18.478 8.0367 0 -19.4019 0 0 -21
  [4,16,0,1,-20,7.654,1,-18.478,8.0367,0,-19.4019,0,0,-21],
// 4 16 7.654 1 -18.478 14.142 1 -14.142 14.8491 0 -14.8491 8.0367 0 -19.4019
  [4,16,7.654,1,-18.478,14.142,1,-14.142,14.8491,0,-14.8491,8.0367,0,-19.4019],
// 4 16 14.142 1 -14.142 18.478 1 -7.654 19.4019 0 -8.0367 14.8491 0 -14.8491
  [4,16,14.142,1,-14.142,18.478,1,-7.654,19.4019,0,-8.0367,14.8491,0,-14.8491],
// 4 16 18.478 1 -7.654 20 1 0 21 0 0 19.4019 0 -8.0367
  [4,16,18.478,1,-7.654,20,1,0,21,0,0,19.4019,0,-8.0367],
// 
// 0 conditional lines
// 5 24 20 1 0 21 0 0 18.478 1 -7.654 18.478 1 7.654
  [5,24,20,1,0,21,0,0,18.478,1,-7.654,18.478,1,7.654],
// 5 24 18.478 1 7.654 19.4019 0 8.0367 20 1 0 14.142 1 14.142
  [5,24,18.478,1,7.654,19.4019,0,8.0367,20,1,0,14.142,1,14.142],
// 5 24 14.142 1 14.142 14.8491 0 14.8491 18.478 1 7.654 7.654 1 18.478
  [5,24,14.142,1,14.142,14.8491,0,14.8491,18.478,1,7.654,7.654,1,18.478],
// 5 24 7.654 1 18.478 8.0367 0 19.4019 14.142 1 14.142 0 1 20
  [5,24,7.654,1,18.478,8.0367,0,19.4019,14.142,1,14.142,0,1,20],
// 5 24 0 1 20 0 0 21 7.654 1 18.478 -7.654 1 18.478
  [5,24,0,1,20,0,0,21,7.654,1,18.478,-7.654,1,18.478],
// 5 24 -7.654 1 18.478 -8.0367 0 19.4019 0 1 20 -14.142 1 14.142
  [5,24,-7.654,1,18.478,-8.0367,0,19.4019,0,1,20,-14.142,1,14.142],
// 5 24 -14.142 1 14.142 -14.8491 0 14.8491 -7.654 1 18.478 -18.478 1 7.654
  [5,24,-14.142,1,14.142,-14.8491,0,14.8491,-7.654,1,18.478,-18.478,1,7.654],
// 5 24 -18.478 1 7.654 -19.4019 0 8.0367 -14.142 1 14.142 -20 1 0
  [5,24,-18.478,1,7.654,-19.4019,0,8.0367,-14.142,1,14.142,-20,1,0],
// 5 24 -20 1 0 -21 0 0 -18.478 1 7.654 -18.478 1 -7.654
  [5,24,-20,1,0,-21,0,0,-18.478,1,7.654,-18.478,1,-7.654],
// 5 24 -18.478 1 -7.654 -19.4019 0 -8.0367 -20 1 0 -14.142 1 -14.142
  [5,24,-18.478,1,-7.654,-19.4019,0,-8.0367,-20,1,0,-14.142,1,-14.142],
// 5 24 -14.142 1 -14.142 -14.8491 0 -14.8491 -18.478 1 -7.654 -7.654 1 -18.478
  [5,24,-14.142,1,-14.142,-14.8491,0,-14.8491,-18.478,1,-7.654,-7.654,1,-18.478],
// 5 24 -7.654 1 -18.478 -8.0367 0 -19.4019 -14.142 1 -14.142 0 1 -20
  [5,24,-7.654,1,-18.478,-8.0367,0,-19.4019,-14.142,1,-14.142,0,1,-20],
// 5 24 0 1 -20 0 0 -21 -7.654 1 -18.478 7.654 1 -18.478
  [5,24,0,1,-20,0,0,-21,-7.654,1,-18.478,7.654,1,-18.478],
// 5 24 7.654 1 -18.478 8.0367 0 -19.4019 0 1 -20 14.142 1 -14.142
  [5,24,7.654,1,-18.478,8.0367,0,-19.4019,0,1,-20,14.142,1,-14.142],
// 5 24 14.142 1 -14.142 14.8491 0 -14.8491 7.654 1 -18.478 18.478 1 -7.654
  [5,24,14.142,1,-14.142,14.8491,0,-14.8491,7.654,1,-18.478,18.478,1,-7.654],
// 5 24 18.478 1 -7.654 19.4019 0 -8.0367 14.142 1 -14.142 20 1 0
  [5,24,18.478,1,-7.654,19.4019,0,-8.0367,14.142,1,-14.142,20,1,0],
// 
// 0 end of file
// 
];
module ldraw_lib__4_4con20(step=0, col=false, unit=2/5, alt=false, line=0.2, solid=!$preview)
    makepoly(ldraw_lib__4_4con20(), step=step, col=col, unit=unit, alt=alt, line=line, solid=solid);
ldraw_lib__4_4con20(line=0.2);
// file: ../p/1-4con23.scad
use <../lib.scad>
function ldraw_lib__1_4con23() = [
// 0 Cone 23 x 0.25
// 0 Name: 1-4con23.dat
// 0 Author: Guy Vivan [guyvivan]
// 0 !LDRAW_ORG Primitive UPDATE 2009-02
// 0 !LICENSE Licensed under CC BY 2.0 and CC BY 4.0 : see CAreadme.txt
// 
// 0 BFC CERTIFY CCW
  [0,"BFC","CERTIFY"],
  [0,"BFC","CCW"],
// 
// 0 !HISTORY 2009-09-03 [PTadmin] Official Update 2009-02
// 
// 
// 4 16 23 1 0 21.2497 1 8.8021 22.1736 0 9.1848 24 0 0
  [4,16,23,1,0,21.2497,1,8.8021,22.1736,0,9.1848,24,0,0],
// 4 16 21.2497 1 8.8021 16.2633 1 16.2633 16.9704 0 16.9704 22.1736 0 9.1848
  [4,16,21.2497,1,8.8021,16.2633,1,16.2633,16.9704,0,16.9704,22.1736,0,9.1848],
// 4 16 16.2633 1 16.2633 8.8021 1 21.2497 9.1848 0 22.1736 16.9704 0 16.9704
  [4,16,16.2633,1,16.2633,8.8021,1,21.2497,9.1848,0,22.1736,16.9704,0,16.9704],
// 4 16 8.8021 1 21.2497 0 1 23 0 0 24 9.1848 0 22.1736
  [4,16,8.8021,1,21.2497,0,1,23,0,0,24,9.1848,0,22.1736],
// 
// 0 conditional lines
// 5 24 23 1 0 24 0 0 21.2497 1 -8.8021 21.2497 1 8.8021
  [5,24,23,1,0,24,0,0,21.2497,1,-8.8021,21.2497,1,8.8021],
// 5 24 21.2497 1 8.8021 22.1736 0 9.1848 23 1 0 16.2633 1 16.2633
  [5,24,21.2497,1,8.8021,22.1736,0,9.1848,23,1,0,16.2633,1,16.2633],
// 5 24 16.2633 1 16.2633 16.9704 0 16.9704 21.2497 1 8.8021 8.8021 1 21.2497
  [5,24,16.2633,1,16.2633,16.9704,0,16.9704,21.2497,1,8.8021,8.8021,1,21.2497],
// 5 24 8.8021 1 21.2497 9.1848 0 22.1736 16.2633 1 16.2633 0 1 23
  [5,24,8.8021,1,21.2497,9.1848,0,22.1736,16.2633,1,16.2633,0,1,23],
// 5 24 0 1 23 0 0 24 8.8021 1 21.2497 -8.8021 1 21.2497
  [5,24,0,1,23,0,0,24,8.8021,1,21.2497,-8.8021,1,21.2497],
// 
// 0 end of file
// 
];
module ldraw_lib__1_4con23(step=0, col=false, unit=2/5, alt=false, line=0.2, solid=!$preview)
    makepoly(ldraw_lib__1_4con23(), step=step, col=col, unit=unit, alt=alt, line=line, solid=solid);
ldraw_lib__1_4con23(line=0.2);
// main file
use <../lib.scad>
use <71533k01.scad>
function ldraw_lib__79306_f2() = [
// 0 Technic Pneumatic Tube  2L with End Bulges
// 0 Name: 79306-f2.dat
// 0 Author: Johann Eisner [technicbasics]
// 0 !LDRAW_ORG Part UPDATE 2023-06
// 0 !LICENSE Licensed under CC BY 4.0 : see CAreadme.txt
// 
// 0 BFC CERTIFY CCW
  [0,"BFC","CERTIFY"],
  [0,"BFC","CCW"],
// 
// 0 !KEYWORDS 16 mm
// 
// 0 !HISTORY 2023-11-19 [OrionP] Official Update 2023-06
// 
// 
// 1 16 0 0 0 0 -1 0 1 0 0 0 0 1 71533k01.dat
  [1,16,0,0,0,0,-1,0,1,0,0,0,0,1, ldraw_lib__71533k01()],
// 1 16 0 0 0 0 1 0 1 0 0 0 0 1 71533k01.dat
  [1,16,0,0,0,0,1,0,1,0,0,0,0,1, ldraw_lib__71533k01()],
];
module ldraw_lib__79306_f2(step=0, col=false, unit=2/5, alt=false, line=0.2, solid=!$preview)
    makepoly(ldraw_lib__79306_f2(), step=step, col=col, unit=unit, alt=alt, line=line, solid=solid);
ldraw_lib__79306_f2(line=0.2);
